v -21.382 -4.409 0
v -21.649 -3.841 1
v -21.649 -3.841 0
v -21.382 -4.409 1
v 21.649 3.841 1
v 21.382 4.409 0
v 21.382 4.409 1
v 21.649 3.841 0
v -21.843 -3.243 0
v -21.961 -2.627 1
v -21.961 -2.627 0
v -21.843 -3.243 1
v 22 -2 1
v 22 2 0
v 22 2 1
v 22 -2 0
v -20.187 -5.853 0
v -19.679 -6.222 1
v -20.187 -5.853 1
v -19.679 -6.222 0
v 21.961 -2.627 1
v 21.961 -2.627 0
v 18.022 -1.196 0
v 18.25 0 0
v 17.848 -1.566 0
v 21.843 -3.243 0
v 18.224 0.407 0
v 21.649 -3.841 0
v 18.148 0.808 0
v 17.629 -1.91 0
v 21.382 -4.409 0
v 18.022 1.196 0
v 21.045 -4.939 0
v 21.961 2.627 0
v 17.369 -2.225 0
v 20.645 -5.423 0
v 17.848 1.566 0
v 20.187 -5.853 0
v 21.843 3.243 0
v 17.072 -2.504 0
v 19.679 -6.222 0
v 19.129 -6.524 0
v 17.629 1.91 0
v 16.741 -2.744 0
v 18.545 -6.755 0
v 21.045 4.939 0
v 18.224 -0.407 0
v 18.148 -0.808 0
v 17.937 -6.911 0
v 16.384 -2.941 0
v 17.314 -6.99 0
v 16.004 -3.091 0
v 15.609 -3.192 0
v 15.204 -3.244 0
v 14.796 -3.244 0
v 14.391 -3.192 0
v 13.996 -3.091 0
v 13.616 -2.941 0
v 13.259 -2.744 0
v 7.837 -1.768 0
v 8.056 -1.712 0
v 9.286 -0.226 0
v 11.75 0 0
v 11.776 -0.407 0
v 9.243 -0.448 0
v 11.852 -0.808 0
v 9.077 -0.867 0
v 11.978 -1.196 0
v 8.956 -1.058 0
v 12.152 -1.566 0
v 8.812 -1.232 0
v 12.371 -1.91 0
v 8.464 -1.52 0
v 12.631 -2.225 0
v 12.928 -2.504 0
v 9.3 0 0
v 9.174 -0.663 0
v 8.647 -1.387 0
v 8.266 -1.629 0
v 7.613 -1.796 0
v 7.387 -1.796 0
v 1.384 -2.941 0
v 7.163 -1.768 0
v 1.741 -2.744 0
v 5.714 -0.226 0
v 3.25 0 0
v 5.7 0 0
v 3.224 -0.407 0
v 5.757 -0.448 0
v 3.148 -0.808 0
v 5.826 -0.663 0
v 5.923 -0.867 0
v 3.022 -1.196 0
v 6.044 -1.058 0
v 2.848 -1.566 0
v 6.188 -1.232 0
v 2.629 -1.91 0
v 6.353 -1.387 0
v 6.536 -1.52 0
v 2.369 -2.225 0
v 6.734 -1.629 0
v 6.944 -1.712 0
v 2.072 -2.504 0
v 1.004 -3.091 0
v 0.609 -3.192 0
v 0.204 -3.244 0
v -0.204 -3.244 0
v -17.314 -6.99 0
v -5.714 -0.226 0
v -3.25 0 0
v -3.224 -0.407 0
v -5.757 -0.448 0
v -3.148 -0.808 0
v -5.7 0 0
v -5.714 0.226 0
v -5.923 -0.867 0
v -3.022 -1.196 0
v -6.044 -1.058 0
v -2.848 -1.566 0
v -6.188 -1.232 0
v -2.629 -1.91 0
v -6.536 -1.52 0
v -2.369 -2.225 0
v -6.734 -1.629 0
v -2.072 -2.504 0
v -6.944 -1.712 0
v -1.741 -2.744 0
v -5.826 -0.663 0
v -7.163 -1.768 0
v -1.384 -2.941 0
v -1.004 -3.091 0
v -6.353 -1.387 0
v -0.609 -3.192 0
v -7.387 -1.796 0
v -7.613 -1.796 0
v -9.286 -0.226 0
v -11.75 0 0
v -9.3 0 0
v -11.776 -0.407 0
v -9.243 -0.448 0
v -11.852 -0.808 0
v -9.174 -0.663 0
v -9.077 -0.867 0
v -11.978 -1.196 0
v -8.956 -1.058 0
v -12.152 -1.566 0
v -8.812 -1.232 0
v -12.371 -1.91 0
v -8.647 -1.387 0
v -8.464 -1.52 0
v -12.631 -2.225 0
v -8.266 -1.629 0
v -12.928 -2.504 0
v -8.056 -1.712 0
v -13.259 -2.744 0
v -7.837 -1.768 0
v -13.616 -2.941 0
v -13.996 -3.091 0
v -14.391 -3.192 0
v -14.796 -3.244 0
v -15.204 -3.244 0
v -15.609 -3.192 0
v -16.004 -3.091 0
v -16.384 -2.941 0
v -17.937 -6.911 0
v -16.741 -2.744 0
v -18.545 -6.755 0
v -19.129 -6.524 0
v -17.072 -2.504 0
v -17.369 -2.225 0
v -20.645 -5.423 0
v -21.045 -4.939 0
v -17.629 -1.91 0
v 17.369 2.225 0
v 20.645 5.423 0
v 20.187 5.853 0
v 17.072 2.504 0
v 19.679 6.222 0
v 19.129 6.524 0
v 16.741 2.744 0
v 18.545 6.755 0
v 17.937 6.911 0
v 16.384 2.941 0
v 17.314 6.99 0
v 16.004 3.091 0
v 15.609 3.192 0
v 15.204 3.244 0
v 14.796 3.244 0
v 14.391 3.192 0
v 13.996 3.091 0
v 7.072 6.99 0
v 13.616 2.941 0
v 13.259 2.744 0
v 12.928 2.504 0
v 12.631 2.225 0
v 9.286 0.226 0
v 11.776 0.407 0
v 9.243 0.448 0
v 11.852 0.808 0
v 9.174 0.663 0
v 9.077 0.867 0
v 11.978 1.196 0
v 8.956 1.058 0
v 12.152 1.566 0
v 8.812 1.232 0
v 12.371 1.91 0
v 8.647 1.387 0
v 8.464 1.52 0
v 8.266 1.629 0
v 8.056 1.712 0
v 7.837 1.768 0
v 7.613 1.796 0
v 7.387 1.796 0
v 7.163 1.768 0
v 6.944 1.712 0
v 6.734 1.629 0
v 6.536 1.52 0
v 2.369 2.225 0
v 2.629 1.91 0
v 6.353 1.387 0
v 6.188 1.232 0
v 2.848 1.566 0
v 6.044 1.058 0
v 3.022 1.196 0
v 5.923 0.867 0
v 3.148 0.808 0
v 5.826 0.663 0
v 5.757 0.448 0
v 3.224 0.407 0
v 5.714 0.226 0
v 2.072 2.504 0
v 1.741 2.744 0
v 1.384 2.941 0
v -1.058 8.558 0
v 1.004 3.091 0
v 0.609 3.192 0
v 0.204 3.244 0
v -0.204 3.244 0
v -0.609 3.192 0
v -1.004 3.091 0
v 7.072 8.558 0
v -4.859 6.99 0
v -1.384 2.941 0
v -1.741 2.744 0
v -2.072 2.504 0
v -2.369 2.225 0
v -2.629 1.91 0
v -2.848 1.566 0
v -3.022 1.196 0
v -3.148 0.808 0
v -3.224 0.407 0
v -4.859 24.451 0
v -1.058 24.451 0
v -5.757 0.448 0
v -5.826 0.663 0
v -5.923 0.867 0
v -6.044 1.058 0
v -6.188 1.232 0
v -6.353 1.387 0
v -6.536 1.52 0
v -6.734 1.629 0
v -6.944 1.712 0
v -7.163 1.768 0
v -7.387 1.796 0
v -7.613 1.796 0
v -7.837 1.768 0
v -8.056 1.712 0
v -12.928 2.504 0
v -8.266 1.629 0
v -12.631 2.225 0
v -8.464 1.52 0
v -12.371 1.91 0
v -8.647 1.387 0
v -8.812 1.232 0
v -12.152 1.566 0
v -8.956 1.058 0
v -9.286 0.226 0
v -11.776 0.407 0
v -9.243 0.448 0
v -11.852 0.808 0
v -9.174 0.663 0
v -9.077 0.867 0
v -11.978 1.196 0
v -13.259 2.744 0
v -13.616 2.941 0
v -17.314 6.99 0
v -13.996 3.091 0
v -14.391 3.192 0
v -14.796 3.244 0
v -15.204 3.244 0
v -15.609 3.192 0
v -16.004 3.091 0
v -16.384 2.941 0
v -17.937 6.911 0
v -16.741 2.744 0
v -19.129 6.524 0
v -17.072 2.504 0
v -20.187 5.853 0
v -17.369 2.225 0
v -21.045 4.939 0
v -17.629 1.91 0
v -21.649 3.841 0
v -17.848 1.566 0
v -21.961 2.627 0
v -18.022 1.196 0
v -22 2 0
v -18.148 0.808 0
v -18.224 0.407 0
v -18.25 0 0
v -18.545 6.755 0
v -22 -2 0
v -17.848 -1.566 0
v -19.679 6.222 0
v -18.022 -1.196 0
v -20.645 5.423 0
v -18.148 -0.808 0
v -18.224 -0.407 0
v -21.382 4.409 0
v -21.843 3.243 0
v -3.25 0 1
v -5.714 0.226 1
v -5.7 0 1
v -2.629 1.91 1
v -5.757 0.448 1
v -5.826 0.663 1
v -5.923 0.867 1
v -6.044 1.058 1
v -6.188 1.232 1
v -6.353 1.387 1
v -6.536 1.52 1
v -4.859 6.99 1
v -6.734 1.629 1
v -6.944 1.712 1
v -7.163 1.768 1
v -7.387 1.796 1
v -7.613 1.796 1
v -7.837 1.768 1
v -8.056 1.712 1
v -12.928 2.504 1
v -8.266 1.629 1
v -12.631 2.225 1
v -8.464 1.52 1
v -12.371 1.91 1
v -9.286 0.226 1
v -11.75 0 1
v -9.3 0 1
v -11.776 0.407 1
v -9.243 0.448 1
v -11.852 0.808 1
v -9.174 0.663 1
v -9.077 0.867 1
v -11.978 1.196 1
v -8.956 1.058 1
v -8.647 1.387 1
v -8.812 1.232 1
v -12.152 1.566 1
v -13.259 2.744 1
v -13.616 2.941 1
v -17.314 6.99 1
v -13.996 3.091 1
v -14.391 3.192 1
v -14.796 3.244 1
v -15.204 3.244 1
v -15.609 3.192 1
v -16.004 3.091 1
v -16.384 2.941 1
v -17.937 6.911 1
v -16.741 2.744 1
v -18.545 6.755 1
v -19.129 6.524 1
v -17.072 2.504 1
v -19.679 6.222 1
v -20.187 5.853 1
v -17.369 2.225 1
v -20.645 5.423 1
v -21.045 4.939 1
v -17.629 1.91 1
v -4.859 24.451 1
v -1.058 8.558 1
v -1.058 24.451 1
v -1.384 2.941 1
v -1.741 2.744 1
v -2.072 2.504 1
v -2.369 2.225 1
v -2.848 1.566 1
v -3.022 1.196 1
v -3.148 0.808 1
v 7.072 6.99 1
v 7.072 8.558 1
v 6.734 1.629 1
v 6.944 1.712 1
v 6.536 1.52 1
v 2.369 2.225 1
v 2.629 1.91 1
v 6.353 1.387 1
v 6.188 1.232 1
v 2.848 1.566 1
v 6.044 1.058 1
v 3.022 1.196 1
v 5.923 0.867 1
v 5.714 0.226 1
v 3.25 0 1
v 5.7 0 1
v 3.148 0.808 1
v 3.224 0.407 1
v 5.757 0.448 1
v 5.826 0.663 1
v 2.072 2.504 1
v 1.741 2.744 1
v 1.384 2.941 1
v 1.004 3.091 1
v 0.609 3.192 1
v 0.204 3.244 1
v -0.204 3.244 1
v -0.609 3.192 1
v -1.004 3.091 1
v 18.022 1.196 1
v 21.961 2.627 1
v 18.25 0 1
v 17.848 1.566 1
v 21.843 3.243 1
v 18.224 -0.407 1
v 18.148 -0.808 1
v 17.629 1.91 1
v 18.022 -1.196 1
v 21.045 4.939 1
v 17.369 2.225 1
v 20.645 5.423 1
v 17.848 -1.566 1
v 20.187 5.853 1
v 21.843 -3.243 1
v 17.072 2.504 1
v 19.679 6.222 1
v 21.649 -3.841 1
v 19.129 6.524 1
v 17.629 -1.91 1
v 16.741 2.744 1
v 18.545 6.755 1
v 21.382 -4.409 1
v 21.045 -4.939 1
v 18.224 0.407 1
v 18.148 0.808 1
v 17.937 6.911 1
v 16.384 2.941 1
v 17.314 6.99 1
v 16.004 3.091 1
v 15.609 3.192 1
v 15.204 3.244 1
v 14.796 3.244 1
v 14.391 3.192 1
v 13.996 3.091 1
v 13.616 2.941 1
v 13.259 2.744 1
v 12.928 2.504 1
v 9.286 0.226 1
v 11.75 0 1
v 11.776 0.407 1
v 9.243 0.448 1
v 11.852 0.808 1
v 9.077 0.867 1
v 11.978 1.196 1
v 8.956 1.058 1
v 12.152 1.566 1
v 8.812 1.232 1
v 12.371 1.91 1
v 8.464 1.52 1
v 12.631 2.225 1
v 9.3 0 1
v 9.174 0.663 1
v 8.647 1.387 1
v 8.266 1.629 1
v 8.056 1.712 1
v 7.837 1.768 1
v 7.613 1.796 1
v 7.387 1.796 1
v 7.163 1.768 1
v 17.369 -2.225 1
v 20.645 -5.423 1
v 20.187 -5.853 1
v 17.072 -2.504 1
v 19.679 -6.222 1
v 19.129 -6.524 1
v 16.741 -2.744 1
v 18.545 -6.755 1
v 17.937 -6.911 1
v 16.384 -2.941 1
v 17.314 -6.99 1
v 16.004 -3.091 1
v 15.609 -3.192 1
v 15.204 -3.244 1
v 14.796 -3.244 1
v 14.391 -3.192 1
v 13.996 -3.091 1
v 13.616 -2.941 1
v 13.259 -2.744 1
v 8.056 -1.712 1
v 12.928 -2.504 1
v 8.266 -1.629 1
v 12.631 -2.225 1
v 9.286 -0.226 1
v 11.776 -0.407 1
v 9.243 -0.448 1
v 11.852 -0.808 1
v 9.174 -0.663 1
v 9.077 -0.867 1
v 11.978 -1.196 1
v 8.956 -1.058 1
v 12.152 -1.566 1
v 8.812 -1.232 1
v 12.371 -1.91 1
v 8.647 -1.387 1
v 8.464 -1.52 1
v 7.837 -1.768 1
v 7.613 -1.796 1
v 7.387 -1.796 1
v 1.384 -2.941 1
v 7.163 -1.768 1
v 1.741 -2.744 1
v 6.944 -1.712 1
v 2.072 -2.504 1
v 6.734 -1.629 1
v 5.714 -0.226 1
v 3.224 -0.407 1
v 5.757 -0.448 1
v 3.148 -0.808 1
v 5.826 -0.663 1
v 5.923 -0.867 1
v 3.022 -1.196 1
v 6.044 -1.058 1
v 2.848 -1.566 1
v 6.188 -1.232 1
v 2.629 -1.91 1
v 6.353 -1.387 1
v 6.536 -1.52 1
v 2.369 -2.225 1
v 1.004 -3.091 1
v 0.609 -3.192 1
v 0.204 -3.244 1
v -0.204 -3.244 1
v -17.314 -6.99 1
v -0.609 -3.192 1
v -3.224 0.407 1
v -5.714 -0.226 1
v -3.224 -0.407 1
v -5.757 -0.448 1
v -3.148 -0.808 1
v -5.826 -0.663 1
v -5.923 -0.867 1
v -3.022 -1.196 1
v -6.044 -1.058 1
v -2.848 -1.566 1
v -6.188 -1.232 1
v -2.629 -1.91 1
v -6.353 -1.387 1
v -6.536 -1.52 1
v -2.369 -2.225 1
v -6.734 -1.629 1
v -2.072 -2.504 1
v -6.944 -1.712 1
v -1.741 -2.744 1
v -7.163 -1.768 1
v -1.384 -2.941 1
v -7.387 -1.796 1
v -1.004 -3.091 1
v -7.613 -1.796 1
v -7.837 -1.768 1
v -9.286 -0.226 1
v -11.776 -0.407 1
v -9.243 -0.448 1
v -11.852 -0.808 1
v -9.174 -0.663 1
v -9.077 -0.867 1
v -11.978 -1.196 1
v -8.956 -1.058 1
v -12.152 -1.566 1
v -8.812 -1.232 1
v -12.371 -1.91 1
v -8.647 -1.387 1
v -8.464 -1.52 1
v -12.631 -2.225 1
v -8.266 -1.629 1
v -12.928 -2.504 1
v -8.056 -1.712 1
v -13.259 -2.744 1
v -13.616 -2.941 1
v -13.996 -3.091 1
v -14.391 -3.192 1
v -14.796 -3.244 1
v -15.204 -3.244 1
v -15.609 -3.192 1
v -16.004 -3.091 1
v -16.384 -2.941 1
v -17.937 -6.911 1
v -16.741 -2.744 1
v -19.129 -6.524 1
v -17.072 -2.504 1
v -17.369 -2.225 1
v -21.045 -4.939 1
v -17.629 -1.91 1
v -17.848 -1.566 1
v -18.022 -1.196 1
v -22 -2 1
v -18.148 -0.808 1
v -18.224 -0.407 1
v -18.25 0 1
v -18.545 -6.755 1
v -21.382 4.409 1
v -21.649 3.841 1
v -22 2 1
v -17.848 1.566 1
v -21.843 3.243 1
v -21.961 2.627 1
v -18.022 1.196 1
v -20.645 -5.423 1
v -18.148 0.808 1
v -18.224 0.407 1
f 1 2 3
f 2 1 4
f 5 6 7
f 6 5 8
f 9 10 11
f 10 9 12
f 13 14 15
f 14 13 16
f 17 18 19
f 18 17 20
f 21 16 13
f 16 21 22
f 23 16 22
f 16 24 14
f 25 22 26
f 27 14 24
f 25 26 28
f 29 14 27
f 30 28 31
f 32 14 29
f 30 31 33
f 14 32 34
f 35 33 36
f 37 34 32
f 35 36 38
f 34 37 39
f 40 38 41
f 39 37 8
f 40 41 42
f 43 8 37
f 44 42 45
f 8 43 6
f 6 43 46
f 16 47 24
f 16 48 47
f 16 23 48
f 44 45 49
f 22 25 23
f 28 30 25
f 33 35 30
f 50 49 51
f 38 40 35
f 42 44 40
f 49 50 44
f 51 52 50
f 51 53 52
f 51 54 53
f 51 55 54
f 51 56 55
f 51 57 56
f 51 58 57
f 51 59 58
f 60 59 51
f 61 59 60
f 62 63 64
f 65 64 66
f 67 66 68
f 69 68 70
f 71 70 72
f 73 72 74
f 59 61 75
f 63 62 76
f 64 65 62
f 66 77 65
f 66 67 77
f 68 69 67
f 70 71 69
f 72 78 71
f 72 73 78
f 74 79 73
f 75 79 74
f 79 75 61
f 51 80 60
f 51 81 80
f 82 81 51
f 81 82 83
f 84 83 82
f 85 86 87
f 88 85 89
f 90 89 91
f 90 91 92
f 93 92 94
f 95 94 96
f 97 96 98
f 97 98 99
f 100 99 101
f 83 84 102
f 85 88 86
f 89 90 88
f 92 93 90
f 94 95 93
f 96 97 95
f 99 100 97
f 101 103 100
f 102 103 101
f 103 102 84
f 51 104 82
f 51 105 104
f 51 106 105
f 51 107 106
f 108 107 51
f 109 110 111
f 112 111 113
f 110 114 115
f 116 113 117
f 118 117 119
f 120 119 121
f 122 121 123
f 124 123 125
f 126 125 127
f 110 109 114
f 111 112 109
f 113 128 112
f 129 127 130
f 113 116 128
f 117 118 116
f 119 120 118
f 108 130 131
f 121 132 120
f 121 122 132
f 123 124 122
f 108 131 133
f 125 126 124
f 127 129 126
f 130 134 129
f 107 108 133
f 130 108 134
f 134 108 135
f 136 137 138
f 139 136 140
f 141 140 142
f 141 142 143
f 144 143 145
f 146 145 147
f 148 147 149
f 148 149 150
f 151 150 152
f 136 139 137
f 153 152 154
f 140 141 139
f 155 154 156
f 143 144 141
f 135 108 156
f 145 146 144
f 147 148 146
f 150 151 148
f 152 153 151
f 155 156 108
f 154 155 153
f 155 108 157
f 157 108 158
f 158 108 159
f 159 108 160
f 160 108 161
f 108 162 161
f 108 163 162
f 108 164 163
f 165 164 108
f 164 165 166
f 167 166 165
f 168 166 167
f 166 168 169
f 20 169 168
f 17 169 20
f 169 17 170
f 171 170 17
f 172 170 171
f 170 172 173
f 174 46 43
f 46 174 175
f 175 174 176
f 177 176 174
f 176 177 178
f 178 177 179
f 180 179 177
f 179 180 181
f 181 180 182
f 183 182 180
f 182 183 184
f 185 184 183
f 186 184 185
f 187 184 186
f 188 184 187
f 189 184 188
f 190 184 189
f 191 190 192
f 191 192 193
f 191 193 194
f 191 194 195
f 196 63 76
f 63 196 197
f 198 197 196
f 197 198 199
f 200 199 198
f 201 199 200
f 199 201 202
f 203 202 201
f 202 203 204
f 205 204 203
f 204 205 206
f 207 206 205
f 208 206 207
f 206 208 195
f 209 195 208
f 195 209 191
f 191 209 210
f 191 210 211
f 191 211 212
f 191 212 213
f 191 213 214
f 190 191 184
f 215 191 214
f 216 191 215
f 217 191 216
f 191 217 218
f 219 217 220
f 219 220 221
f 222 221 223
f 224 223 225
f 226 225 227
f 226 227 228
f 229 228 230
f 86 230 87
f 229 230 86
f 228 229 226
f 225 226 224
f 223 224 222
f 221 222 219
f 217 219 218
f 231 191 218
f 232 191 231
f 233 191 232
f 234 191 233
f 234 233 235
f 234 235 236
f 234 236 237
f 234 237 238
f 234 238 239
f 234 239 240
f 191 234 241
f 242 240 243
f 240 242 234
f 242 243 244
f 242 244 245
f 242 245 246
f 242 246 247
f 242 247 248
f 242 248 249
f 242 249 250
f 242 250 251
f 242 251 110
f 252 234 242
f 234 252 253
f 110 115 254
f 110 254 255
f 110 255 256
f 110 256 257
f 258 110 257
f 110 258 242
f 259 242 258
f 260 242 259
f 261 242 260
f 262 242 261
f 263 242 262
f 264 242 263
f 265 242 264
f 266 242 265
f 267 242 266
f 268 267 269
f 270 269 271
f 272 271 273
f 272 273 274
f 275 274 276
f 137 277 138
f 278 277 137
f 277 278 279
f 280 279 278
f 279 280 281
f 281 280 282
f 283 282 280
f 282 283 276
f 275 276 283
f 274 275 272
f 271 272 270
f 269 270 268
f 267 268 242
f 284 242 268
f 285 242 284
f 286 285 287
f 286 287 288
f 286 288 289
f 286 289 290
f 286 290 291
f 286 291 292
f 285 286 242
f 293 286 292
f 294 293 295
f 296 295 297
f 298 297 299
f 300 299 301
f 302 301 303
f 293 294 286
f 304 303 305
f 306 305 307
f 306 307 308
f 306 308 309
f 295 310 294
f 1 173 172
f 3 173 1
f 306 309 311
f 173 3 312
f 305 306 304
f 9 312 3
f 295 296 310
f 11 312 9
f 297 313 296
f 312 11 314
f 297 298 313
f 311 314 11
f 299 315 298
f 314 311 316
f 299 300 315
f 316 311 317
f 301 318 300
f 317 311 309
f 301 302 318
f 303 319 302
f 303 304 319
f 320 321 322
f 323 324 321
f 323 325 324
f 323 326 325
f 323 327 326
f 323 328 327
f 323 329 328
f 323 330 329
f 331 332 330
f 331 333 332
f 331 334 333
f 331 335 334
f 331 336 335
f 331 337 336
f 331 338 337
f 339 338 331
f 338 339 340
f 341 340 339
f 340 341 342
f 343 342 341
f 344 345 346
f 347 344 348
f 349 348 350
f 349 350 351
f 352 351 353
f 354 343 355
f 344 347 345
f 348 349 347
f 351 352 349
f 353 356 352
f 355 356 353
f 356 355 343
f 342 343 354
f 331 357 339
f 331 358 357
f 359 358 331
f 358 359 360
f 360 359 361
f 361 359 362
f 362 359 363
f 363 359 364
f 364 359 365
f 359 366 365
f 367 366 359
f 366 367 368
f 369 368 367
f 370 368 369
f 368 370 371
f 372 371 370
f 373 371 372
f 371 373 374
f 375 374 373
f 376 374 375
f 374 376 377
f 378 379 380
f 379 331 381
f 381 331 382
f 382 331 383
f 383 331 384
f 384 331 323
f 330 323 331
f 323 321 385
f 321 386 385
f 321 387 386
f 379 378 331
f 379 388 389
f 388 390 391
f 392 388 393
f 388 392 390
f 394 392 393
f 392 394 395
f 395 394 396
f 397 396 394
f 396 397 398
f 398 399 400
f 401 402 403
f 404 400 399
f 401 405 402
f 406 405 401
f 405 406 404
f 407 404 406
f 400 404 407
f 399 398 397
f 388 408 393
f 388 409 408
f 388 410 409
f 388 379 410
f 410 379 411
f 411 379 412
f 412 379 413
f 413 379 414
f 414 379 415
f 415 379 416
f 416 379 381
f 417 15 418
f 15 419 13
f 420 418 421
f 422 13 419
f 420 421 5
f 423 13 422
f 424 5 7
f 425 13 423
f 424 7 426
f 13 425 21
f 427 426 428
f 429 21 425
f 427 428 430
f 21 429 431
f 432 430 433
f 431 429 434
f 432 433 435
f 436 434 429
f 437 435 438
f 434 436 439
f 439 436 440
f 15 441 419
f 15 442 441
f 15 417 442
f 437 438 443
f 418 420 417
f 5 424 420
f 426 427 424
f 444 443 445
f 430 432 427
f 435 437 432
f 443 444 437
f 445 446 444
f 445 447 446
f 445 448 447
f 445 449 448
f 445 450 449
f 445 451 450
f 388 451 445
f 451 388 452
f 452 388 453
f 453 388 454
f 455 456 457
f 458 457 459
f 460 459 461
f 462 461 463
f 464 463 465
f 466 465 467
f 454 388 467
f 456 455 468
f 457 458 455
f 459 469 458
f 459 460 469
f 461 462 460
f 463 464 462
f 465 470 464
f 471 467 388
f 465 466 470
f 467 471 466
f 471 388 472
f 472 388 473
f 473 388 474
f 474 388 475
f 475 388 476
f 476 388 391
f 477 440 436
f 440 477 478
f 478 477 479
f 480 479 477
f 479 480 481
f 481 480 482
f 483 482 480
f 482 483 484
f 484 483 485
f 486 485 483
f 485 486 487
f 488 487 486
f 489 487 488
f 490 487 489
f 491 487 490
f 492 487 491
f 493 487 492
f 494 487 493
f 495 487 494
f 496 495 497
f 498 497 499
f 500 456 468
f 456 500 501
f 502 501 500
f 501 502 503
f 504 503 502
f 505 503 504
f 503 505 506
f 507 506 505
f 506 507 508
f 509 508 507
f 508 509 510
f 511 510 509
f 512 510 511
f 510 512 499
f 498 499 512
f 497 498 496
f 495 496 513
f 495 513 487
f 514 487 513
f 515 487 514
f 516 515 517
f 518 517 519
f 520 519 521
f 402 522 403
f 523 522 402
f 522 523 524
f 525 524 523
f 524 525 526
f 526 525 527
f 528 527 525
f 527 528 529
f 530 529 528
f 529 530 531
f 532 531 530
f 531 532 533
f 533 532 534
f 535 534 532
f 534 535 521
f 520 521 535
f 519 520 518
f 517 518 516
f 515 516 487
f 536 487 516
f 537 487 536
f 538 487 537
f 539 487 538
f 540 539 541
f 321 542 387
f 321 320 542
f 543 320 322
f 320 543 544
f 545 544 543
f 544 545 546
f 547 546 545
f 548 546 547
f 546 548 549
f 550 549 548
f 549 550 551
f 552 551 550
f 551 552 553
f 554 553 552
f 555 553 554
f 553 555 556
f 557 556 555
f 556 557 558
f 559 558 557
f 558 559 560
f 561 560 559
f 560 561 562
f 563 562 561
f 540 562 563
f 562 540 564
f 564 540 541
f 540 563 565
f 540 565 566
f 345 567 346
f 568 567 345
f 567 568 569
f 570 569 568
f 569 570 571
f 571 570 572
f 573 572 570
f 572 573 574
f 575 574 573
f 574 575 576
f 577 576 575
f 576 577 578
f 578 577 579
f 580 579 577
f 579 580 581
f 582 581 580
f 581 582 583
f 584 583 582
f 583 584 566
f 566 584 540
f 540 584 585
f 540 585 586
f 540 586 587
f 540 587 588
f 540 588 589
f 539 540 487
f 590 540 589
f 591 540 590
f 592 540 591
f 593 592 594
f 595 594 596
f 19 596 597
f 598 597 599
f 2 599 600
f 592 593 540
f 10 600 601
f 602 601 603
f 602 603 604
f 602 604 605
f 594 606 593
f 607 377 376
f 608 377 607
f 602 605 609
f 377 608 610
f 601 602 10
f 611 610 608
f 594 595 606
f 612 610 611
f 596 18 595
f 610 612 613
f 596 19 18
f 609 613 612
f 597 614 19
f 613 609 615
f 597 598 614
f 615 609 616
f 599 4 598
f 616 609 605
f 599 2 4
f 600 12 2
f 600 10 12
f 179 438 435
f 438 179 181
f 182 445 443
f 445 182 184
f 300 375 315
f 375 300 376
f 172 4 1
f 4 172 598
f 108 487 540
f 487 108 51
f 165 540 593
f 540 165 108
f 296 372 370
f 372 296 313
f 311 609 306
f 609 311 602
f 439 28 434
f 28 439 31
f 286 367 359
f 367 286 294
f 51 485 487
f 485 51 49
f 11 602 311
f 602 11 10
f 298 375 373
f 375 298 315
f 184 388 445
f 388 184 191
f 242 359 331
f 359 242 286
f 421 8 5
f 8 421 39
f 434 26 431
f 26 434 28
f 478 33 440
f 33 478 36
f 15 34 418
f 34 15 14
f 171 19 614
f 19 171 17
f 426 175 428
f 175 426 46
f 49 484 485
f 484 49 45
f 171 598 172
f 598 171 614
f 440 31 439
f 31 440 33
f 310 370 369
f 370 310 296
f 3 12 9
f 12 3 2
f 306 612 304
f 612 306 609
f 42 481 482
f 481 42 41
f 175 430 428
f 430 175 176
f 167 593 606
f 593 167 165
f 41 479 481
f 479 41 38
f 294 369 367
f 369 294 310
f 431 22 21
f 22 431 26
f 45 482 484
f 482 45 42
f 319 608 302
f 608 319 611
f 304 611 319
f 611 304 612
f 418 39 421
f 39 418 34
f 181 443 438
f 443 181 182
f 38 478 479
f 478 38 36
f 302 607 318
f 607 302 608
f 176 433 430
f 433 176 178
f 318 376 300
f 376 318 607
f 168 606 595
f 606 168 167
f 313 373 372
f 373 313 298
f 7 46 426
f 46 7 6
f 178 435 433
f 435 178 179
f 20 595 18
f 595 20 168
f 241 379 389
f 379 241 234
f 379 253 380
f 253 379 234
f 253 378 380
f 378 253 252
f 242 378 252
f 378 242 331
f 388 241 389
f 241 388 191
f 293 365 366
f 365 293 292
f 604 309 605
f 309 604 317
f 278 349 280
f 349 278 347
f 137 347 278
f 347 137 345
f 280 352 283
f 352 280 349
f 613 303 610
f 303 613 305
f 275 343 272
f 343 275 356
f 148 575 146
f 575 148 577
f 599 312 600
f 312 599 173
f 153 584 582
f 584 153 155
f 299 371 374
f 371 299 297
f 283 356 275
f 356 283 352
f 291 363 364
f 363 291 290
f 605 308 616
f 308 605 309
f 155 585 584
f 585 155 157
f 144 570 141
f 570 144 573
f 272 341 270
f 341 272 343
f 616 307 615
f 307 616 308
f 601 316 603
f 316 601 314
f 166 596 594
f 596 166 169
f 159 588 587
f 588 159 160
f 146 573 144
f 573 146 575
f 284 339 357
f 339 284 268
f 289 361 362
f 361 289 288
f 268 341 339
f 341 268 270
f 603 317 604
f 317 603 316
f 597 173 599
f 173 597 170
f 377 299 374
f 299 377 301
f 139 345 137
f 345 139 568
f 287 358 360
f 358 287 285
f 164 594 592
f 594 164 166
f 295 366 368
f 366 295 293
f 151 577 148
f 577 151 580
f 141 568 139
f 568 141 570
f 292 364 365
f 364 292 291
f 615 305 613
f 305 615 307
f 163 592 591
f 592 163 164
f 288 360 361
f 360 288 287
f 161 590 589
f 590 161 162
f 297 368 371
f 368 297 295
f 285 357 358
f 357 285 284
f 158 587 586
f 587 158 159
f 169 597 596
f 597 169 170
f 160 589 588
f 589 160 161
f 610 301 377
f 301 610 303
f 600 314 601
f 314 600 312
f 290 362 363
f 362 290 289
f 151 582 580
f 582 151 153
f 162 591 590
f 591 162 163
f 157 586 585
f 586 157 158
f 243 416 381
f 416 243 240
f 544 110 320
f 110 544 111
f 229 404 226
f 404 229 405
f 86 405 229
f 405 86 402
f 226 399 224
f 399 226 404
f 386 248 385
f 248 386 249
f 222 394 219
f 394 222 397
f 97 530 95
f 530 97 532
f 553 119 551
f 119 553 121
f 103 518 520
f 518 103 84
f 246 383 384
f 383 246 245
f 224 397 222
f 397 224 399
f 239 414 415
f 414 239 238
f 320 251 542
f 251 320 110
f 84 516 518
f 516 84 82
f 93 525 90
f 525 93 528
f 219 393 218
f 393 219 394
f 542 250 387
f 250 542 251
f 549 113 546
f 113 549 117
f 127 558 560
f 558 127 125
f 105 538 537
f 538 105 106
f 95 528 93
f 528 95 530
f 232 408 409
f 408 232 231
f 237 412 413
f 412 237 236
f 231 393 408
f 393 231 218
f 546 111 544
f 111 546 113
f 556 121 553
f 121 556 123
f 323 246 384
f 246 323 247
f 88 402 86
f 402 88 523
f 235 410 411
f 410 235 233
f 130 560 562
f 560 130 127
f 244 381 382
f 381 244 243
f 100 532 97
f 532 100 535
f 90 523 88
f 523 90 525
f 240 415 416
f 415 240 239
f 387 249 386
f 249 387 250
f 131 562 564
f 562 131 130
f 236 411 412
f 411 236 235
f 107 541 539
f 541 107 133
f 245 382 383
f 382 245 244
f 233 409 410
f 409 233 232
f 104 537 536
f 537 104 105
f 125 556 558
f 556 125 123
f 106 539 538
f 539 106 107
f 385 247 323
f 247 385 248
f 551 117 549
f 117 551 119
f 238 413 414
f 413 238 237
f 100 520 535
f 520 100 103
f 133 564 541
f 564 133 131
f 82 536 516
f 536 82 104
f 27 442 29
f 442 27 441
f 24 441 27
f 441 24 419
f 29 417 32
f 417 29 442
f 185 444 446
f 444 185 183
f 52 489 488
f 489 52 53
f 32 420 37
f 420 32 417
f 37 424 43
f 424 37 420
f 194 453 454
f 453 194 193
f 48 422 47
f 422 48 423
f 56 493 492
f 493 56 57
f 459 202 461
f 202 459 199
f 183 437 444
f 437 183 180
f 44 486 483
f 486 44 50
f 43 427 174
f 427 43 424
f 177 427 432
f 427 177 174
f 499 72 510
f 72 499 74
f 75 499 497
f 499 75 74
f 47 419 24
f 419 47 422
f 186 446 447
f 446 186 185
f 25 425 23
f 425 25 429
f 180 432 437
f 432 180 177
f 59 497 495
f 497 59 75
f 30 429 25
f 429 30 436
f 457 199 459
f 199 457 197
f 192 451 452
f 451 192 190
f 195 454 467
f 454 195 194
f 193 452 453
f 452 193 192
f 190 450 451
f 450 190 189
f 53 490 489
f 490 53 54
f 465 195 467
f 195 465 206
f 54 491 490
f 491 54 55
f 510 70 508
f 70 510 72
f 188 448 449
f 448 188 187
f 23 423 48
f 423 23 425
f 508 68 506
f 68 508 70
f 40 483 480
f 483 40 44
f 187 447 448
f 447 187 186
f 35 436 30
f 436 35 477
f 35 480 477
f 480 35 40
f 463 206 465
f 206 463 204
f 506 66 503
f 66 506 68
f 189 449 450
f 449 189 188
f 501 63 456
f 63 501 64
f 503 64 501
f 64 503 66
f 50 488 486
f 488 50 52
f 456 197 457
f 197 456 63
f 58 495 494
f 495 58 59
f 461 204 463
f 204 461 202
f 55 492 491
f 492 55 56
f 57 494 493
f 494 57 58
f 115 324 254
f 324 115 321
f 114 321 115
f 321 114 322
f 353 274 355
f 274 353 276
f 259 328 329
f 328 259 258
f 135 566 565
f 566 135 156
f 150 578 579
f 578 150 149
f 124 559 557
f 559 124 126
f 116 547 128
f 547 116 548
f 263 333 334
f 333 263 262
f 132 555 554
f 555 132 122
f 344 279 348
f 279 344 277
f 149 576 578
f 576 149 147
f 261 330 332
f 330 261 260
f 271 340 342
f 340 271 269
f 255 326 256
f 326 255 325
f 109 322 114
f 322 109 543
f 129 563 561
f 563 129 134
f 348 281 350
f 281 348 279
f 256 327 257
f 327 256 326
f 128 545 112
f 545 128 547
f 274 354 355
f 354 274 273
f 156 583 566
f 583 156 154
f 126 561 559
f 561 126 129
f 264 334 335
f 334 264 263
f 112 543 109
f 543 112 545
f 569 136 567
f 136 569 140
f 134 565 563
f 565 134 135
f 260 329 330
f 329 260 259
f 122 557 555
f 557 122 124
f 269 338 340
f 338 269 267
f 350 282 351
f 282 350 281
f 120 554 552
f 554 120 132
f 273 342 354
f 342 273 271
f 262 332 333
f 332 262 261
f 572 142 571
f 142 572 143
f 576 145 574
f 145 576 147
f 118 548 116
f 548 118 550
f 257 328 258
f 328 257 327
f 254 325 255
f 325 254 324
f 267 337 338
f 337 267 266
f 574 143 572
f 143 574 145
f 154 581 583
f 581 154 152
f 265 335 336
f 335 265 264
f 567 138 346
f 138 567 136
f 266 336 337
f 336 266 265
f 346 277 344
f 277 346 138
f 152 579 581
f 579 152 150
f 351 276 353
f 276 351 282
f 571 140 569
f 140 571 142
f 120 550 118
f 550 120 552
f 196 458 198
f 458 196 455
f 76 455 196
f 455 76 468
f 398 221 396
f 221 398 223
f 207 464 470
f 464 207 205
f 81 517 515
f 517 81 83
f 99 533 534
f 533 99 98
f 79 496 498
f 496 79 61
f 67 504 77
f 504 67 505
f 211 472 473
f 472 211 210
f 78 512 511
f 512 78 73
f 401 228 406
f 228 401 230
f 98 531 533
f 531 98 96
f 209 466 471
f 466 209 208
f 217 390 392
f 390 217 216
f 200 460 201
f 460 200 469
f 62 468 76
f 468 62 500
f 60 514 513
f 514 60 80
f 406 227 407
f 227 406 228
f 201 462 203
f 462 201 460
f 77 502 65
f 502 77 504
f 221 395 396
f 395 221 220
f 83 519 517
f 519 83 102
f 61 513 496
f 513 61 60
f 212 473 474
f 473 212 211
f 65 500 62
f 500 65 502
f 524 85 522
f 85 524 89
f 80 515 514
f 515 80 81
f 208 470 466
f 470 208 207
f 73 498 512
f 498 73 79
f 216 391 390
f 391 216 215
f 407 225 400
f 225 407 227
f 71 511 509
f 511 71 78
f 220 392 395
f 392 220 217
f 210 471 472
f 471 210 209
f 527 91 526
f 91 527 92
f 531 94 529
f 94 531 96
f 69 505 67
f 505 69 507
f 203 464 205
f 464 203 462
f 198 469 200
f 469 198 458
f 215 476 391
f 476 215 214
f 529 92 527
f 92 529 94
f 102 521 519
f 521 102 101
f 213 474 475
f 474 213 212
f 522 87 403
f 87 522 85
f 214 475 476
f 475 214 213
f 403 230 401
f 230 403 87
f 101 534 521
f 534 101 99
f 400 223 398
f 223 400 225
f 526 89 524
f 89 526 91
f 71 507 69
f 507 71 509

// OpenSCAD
$fn = 50;


difference() {
	union() {
		hull() {
			translate(v = [-17.0000000000, 2.0000000000, 0]) {
				cylinder(h = 1, r = 5);
			}
			translate(v = [17.0000000000, 2.0000000000, 0]) {
				cylinder(h = 1, r = 5);
			}
			translate(v = [-17.0000000000, -2.0000000000, 0]) {
				cylinder(h = 1, r = 5);
			}
			translate(v = [17.0000000000, -2.0000000000, 0]) {
				cylinder(h = 1, r = 5);
			}
		}
		translate(v = [0, 24, 0]) {
			linear_extrude(height = 1) {
				text(font = "DejaVu Sans Mono:style=Bold", halign = "center", size = 19.0000000000, text = "L", valign = "top");
			}
		}
	}
	union() {
		translate(v = [-15.0000000000, 0.0000000000, 0]) {
			translate(v = [0, 0, -100]) {
				cylinder(h = 200, r = 3.2500000000);
			}
		}
		translate(v = [0, 0, -100]) {
			cylinder(h = 200, r = 3.2500000000);
		}
		translate(v = [15.0000000000, 0.0000000000, 0]) {
			translate(v = [0, 0, -100]) {
				cylinder(h = 200, r = 3.2500000000);
			}
		}
		translate(v = [-15.0000000000, 0.0000000000, 0]) {
			translate(v = [0, 0, -100]) {
				cylinder(h = 200, r = 1.8000000000);
			}
		}
		translate(v = [-7.5000000000, 0.0000000000, 0]) {
			translate(v = [0, 0, -100]) {
				cylinder(h = 200, r = 1.8000000000);
			}
		}
		translate(v = [0, 0, -100]) {
			cylinder(h = 200, r = 1.8000000000);
		}
		translate(v = [7.5000000000, 0.0000000000, 0]) {
			translate(v = [0, 0, -100]) {
				cylinder(h = 200, r = 1.8000000000);
			}
		}
		translate(v = [15.0000000000, 0.0000000000, 0]) {
			translate(v = [0, 0, -100]) {
				cylinder(h = 200, r = 1.8000000000);
			}
		}
	}
}
